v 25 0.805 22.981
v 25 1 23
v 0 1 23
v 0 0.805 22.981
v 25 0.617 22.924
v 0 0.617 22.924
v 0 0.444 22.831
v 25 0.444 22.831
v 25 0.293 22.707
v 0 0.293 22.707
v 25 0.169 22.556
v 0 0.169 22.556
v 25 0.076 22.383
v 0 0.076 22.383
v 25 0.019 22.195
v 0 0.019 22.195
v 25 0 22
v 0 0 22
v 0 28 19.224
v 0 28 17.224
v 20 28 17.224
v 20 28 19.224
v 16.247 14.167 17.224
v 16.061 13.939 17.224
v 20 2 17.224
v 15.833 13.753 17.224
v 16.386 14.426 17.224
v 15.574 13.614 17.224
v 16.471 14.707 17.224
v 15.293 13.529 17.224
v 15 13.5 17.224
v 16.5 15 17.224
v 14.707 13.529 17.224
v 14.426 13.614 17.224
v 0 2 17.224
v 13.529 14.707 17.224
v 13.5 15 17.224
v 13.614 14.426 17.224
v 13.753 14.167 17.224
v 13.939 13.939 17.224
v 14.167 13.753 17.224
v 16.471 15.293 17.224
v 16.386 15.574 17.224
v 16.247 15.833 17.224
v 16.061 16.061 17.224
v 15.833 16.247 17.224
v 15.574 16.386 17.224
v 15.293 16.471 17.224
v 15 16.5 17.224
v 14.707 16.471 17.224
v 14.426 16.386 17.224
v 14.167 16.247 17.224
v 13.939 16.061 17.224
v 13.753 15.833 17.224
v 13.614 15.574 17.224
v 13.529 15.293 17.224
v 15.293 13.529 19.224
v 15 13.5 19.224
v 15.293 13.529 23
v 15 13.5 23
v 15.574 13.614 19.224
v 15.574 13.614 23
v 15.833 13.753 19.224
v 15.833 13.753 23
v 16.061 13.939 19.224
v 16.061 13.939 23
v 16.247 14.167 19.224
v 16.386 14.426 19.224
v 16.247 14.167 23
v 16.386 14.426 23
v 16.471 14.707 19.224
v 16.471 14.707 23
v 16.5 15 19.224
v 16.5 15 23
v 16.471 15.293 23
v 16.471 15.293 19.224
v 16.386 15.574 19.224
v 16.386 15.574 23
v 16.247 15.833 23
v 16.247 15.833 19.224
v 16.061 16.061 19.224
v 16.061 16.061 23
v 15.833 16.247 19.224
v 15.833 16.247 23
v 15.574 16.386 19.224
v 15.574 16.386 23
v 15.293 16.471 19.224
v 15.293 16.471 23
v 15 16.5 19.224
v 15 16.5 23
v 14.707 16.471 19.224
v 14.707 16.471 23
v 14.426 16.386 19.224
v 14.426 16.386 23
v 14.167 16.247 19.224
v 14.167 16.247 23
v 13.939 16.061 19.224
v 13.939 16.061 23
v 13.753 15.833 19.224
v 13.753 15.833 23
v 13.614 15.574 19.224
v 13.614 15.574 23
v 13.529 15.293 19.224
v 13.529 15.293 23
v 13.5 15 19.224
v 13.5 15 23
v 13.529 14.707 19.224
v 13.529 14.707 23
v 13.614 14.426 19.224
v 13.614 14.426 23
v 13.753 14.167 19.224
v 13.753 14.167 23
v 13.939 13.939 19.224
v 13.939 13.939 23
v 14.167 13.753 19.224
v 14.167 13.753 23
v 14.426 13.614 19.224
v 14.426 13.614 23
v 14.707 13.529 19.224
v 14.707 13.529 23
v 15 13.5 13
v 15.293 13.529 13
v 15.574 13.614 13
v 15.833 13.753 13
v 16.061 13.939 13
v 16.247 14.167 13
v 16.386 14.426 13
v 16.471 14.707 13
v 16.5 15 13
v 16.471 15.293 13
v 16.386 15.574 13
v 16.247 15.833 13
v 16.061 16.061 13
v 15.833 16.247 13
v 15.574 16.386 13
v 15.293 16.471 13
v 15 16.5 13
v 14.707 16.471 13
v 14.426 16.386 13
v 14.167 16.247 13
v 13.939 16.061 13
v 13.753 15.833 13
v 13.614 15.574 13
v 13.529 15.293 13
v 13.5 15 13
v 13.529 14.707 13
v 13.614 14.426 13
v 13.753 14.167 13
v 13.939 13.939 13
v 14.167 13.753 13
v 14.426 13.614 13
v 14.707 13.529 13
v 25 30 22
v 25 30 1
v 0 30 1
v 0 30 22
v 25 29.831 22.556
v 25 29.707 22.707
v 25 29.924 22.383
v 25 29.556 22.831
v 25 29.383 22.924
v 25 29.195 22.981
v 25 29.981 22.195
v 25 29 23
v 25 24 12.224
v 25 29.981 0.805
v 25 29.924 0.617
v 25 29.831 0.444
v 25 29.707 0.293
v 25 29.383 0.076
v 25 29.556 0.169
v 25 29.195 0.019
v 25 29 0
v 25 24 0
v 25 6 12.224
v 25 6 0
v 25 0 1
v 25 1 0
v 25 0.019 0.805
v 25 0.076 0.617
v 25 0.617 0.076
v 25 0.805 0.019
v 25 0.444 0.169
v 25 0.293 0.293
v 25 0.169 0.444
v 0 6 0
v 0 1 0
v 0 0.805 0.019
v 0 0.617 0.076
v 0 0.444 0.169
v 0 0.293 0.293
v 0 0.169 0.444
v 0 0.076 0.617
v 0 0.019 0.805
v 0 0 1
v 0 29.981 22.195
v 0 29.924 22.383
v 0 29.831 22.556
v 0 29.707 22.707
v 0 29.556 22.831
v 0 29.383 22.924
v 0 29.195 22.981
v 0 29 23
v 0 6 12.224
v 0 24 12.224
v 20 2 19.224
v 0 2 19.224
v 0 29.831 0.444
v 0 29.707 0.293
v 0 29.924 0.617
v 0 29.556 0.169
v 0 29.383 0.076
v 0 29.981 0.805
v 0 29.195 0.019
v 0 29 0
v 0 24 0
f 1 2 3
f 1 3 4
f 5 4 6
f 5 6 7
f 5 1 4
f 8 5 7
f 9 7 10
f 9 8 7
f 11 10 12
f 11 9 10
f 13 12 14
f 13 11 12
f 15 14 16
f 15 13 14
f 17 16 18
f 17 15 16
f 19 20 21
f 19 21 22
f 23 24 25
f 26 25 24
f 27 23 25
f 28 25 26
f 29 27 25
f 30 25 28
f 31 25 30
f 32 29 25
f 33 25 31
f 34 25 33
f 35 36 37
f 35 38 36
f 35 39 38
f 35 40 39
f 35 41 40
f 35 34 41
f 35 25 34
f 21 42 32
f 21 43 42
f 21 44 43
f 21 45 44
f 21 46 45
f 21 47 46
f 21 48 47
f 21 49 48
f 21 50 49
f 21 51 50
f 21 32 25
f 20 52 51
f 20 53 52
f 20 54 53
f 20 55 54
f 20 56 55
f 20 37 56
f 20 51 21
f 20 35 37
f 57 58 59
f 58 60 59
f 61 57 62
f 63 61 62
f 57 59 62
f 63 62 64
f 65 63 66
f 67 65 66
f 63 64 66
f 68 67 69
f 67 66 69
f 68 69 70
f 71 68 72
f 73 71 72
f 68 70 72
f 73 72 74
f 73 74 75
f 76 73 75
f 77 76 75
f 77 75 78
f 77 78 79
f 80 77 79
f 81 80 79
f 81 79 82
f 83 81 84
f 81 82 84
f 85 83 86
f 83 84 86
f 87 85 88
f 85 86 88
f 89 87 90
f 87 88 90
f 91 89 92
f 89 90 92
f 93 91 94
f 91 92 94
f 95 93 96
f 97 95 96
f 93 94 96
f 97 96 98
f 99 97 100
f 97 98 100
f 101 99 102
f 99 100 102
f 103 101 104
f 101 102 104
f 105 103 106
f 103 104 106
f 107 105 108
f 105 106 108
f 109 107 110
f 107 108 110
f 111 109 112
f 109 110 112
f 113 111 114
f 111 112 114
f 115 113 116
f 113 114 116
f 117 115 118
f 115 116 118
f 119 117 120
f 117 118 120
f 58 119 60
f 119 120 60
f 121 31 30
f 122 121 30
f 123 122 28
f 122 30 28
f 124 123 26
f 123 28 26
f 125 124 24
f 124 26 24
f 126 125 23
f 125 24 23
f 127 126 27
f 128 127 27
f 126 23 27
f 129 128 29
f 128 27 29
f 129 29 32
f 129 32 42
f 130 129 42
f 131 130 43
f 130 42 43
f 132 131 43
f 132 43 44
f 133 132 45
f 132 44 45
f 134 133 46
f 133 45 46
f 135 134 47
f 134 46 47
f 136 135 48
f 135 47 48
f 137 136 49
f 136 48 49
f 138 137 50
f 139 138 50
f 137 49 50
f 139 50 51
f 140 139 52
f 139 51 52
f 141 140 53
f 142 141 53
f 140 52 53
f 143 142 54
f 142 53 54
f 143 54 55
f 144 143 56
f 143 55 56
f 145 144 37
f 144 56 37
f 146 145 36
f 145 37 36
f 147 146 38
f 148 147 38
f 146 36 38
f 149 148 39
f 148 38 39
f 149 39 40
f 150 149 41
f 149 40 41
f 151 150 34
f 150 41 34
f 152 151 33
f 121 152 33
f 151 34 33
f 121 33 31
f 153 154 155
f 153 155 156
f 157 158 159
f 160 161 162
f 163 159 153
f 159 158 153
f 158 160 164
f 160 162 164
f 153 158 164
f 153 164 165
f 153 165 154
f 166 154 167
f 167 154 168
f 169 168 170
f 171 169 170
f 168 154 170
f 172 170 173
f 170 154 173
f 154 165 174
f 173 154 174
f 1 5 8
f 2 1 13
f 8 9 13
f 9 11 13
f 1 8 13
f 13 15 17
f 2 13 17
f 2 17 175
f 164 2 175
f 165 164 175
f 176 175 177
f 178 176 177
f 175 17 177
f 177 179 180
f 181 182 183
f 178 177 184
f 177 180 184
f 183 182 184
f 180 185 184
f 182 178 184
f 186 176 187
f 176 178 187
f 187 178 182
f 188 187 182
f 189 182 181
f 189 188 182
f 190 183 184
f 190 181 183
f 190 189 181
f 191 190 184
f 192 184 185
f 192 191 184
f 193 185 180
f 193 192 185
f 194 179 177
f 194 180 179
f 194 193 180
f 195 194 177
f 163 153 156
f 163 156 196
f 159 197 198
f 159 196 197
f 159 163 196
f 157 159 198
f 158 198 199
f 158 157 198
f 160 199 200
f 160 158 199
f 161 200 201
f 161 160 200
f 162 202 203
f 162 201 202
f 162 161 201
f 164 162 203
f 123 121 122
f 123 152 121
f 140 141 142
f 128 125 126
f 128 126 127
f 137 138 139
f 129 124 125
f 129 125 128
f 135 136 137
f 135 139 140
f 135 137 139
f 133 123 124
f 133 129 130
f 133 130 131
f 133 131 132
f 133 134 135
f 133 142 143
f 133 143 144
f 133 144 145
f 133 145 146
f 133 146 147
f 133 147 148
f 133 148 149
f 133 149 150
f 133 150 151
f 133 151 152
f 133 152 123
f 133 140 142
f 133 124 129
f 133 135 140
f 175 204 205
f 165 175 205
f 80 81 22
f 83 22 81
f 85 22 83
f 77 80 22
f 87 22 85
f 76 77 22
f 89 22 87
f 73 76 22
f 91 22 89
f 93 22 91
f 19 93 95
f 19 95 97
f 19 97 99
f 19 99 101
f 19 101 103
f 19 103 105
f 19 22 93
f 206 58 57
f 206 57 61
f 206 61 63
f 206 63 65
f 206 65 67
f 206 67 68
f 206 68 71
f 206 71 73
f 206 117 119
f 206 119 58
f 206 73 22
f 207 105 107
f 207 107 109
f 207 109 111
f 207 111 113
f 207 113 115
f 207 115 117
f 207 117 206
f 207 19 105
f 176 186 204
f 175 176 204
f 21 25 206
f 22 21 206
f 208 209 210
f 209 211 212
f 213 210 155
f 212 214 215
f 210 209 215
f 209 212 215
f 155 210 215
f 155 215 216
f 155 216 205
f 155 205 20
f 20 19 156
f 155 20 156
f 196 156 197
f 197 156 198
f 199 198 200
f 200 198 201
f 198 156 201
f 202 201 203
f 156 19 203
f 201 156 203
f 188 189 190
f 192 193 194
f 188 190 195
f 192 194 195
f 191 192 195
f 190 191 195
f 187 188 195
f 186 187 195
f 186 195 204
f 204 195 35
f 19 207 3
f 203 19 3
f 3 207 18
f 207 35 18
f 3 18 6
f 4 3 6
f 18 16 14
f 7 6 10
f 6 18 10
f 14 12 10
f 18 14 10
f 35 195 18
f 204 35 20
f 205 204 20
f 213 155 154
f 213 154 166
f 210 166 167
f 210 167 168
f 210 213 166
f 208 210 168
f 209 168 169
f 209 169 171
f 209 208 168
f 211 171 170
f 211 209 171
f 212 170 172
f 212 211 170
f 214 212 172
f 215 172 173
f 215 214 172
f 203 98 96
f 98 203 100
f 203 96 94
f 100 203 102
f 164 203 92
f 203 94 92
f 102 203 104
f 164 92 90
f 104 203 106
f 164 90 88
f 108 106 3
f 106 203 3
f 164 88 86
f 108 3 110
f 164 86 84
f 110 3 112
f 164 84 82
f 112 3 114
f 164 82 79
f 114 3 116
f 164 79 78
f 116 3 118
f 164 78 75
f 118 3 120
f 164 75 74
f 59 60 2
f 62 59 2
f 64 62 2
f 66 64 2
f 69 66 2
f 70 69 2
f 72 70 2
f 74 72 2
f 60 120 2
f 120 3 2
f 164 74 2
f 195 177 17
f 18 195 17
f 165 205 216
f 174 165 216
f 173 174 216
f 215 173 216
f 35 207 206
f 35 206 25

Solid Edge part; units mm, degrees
sketch "Sketch1" plane through (0, 0, 0) normal (0, -1, 0) x (1, 0, 0)
  line L0 (0, 23) -> (25, 23)
  line L1 (25, 23) -> (25, 0)
  line L2 (25, 0) -> (0, 0)
  line L3 (0, 0) -> (0, 23)
extrude "Protrusion1" add sketch "Sketch1" against normal blind 30
sketch "Sketch2" plane through (0, 15, 11.5) normal (-1, 0, 0) x (0, -1, 0)
  line L0 (13, 5.7235) -> (-13, 5.7235)
  line L1 (-13, 5.7235) -> (-13, 7.7235)
  line L2 (-13, 7.7235) -> (13, 7.7235)
  line L3 (13, 7.7235) -> (13, 5.7235)
extrude "ExtrudedCutout_2" cut sketch "Sketch2" against normal blind 20
sketch "Sketch3" plane through (12.5, 15, 23) normal (0, 0, 1) x (0, -1, 0)
  circle A0 centre (0, 2.5) radius 1.5
extrude "ExtrudedCutout_3" cut sketch "Sketch3" against normal blind 10
sketch "Sketch4" plane through (0, 15, 11.5) normal (-1, 0, 0) x (0, -1, 0)
  line L0 (9, 0.7235) -> (-9, 0.7235)
  line L1 (-9, 0.7235) -> (-9, -14.6264)
  line L2 (-9, -14.6264) -> (9, -14.6264)
  line L3 (9, -14.6264) -> (9, 0.7235)
extrude "ExtrudedCutout_4" cut sketch "Sketch4" against normal blind 84.6021
fillet "Round_2" radius 1 4 edges at (12.5, 0, 23) (12.5, 0, 0) (12.5, 30, 23) (12.5, 30, 0)
